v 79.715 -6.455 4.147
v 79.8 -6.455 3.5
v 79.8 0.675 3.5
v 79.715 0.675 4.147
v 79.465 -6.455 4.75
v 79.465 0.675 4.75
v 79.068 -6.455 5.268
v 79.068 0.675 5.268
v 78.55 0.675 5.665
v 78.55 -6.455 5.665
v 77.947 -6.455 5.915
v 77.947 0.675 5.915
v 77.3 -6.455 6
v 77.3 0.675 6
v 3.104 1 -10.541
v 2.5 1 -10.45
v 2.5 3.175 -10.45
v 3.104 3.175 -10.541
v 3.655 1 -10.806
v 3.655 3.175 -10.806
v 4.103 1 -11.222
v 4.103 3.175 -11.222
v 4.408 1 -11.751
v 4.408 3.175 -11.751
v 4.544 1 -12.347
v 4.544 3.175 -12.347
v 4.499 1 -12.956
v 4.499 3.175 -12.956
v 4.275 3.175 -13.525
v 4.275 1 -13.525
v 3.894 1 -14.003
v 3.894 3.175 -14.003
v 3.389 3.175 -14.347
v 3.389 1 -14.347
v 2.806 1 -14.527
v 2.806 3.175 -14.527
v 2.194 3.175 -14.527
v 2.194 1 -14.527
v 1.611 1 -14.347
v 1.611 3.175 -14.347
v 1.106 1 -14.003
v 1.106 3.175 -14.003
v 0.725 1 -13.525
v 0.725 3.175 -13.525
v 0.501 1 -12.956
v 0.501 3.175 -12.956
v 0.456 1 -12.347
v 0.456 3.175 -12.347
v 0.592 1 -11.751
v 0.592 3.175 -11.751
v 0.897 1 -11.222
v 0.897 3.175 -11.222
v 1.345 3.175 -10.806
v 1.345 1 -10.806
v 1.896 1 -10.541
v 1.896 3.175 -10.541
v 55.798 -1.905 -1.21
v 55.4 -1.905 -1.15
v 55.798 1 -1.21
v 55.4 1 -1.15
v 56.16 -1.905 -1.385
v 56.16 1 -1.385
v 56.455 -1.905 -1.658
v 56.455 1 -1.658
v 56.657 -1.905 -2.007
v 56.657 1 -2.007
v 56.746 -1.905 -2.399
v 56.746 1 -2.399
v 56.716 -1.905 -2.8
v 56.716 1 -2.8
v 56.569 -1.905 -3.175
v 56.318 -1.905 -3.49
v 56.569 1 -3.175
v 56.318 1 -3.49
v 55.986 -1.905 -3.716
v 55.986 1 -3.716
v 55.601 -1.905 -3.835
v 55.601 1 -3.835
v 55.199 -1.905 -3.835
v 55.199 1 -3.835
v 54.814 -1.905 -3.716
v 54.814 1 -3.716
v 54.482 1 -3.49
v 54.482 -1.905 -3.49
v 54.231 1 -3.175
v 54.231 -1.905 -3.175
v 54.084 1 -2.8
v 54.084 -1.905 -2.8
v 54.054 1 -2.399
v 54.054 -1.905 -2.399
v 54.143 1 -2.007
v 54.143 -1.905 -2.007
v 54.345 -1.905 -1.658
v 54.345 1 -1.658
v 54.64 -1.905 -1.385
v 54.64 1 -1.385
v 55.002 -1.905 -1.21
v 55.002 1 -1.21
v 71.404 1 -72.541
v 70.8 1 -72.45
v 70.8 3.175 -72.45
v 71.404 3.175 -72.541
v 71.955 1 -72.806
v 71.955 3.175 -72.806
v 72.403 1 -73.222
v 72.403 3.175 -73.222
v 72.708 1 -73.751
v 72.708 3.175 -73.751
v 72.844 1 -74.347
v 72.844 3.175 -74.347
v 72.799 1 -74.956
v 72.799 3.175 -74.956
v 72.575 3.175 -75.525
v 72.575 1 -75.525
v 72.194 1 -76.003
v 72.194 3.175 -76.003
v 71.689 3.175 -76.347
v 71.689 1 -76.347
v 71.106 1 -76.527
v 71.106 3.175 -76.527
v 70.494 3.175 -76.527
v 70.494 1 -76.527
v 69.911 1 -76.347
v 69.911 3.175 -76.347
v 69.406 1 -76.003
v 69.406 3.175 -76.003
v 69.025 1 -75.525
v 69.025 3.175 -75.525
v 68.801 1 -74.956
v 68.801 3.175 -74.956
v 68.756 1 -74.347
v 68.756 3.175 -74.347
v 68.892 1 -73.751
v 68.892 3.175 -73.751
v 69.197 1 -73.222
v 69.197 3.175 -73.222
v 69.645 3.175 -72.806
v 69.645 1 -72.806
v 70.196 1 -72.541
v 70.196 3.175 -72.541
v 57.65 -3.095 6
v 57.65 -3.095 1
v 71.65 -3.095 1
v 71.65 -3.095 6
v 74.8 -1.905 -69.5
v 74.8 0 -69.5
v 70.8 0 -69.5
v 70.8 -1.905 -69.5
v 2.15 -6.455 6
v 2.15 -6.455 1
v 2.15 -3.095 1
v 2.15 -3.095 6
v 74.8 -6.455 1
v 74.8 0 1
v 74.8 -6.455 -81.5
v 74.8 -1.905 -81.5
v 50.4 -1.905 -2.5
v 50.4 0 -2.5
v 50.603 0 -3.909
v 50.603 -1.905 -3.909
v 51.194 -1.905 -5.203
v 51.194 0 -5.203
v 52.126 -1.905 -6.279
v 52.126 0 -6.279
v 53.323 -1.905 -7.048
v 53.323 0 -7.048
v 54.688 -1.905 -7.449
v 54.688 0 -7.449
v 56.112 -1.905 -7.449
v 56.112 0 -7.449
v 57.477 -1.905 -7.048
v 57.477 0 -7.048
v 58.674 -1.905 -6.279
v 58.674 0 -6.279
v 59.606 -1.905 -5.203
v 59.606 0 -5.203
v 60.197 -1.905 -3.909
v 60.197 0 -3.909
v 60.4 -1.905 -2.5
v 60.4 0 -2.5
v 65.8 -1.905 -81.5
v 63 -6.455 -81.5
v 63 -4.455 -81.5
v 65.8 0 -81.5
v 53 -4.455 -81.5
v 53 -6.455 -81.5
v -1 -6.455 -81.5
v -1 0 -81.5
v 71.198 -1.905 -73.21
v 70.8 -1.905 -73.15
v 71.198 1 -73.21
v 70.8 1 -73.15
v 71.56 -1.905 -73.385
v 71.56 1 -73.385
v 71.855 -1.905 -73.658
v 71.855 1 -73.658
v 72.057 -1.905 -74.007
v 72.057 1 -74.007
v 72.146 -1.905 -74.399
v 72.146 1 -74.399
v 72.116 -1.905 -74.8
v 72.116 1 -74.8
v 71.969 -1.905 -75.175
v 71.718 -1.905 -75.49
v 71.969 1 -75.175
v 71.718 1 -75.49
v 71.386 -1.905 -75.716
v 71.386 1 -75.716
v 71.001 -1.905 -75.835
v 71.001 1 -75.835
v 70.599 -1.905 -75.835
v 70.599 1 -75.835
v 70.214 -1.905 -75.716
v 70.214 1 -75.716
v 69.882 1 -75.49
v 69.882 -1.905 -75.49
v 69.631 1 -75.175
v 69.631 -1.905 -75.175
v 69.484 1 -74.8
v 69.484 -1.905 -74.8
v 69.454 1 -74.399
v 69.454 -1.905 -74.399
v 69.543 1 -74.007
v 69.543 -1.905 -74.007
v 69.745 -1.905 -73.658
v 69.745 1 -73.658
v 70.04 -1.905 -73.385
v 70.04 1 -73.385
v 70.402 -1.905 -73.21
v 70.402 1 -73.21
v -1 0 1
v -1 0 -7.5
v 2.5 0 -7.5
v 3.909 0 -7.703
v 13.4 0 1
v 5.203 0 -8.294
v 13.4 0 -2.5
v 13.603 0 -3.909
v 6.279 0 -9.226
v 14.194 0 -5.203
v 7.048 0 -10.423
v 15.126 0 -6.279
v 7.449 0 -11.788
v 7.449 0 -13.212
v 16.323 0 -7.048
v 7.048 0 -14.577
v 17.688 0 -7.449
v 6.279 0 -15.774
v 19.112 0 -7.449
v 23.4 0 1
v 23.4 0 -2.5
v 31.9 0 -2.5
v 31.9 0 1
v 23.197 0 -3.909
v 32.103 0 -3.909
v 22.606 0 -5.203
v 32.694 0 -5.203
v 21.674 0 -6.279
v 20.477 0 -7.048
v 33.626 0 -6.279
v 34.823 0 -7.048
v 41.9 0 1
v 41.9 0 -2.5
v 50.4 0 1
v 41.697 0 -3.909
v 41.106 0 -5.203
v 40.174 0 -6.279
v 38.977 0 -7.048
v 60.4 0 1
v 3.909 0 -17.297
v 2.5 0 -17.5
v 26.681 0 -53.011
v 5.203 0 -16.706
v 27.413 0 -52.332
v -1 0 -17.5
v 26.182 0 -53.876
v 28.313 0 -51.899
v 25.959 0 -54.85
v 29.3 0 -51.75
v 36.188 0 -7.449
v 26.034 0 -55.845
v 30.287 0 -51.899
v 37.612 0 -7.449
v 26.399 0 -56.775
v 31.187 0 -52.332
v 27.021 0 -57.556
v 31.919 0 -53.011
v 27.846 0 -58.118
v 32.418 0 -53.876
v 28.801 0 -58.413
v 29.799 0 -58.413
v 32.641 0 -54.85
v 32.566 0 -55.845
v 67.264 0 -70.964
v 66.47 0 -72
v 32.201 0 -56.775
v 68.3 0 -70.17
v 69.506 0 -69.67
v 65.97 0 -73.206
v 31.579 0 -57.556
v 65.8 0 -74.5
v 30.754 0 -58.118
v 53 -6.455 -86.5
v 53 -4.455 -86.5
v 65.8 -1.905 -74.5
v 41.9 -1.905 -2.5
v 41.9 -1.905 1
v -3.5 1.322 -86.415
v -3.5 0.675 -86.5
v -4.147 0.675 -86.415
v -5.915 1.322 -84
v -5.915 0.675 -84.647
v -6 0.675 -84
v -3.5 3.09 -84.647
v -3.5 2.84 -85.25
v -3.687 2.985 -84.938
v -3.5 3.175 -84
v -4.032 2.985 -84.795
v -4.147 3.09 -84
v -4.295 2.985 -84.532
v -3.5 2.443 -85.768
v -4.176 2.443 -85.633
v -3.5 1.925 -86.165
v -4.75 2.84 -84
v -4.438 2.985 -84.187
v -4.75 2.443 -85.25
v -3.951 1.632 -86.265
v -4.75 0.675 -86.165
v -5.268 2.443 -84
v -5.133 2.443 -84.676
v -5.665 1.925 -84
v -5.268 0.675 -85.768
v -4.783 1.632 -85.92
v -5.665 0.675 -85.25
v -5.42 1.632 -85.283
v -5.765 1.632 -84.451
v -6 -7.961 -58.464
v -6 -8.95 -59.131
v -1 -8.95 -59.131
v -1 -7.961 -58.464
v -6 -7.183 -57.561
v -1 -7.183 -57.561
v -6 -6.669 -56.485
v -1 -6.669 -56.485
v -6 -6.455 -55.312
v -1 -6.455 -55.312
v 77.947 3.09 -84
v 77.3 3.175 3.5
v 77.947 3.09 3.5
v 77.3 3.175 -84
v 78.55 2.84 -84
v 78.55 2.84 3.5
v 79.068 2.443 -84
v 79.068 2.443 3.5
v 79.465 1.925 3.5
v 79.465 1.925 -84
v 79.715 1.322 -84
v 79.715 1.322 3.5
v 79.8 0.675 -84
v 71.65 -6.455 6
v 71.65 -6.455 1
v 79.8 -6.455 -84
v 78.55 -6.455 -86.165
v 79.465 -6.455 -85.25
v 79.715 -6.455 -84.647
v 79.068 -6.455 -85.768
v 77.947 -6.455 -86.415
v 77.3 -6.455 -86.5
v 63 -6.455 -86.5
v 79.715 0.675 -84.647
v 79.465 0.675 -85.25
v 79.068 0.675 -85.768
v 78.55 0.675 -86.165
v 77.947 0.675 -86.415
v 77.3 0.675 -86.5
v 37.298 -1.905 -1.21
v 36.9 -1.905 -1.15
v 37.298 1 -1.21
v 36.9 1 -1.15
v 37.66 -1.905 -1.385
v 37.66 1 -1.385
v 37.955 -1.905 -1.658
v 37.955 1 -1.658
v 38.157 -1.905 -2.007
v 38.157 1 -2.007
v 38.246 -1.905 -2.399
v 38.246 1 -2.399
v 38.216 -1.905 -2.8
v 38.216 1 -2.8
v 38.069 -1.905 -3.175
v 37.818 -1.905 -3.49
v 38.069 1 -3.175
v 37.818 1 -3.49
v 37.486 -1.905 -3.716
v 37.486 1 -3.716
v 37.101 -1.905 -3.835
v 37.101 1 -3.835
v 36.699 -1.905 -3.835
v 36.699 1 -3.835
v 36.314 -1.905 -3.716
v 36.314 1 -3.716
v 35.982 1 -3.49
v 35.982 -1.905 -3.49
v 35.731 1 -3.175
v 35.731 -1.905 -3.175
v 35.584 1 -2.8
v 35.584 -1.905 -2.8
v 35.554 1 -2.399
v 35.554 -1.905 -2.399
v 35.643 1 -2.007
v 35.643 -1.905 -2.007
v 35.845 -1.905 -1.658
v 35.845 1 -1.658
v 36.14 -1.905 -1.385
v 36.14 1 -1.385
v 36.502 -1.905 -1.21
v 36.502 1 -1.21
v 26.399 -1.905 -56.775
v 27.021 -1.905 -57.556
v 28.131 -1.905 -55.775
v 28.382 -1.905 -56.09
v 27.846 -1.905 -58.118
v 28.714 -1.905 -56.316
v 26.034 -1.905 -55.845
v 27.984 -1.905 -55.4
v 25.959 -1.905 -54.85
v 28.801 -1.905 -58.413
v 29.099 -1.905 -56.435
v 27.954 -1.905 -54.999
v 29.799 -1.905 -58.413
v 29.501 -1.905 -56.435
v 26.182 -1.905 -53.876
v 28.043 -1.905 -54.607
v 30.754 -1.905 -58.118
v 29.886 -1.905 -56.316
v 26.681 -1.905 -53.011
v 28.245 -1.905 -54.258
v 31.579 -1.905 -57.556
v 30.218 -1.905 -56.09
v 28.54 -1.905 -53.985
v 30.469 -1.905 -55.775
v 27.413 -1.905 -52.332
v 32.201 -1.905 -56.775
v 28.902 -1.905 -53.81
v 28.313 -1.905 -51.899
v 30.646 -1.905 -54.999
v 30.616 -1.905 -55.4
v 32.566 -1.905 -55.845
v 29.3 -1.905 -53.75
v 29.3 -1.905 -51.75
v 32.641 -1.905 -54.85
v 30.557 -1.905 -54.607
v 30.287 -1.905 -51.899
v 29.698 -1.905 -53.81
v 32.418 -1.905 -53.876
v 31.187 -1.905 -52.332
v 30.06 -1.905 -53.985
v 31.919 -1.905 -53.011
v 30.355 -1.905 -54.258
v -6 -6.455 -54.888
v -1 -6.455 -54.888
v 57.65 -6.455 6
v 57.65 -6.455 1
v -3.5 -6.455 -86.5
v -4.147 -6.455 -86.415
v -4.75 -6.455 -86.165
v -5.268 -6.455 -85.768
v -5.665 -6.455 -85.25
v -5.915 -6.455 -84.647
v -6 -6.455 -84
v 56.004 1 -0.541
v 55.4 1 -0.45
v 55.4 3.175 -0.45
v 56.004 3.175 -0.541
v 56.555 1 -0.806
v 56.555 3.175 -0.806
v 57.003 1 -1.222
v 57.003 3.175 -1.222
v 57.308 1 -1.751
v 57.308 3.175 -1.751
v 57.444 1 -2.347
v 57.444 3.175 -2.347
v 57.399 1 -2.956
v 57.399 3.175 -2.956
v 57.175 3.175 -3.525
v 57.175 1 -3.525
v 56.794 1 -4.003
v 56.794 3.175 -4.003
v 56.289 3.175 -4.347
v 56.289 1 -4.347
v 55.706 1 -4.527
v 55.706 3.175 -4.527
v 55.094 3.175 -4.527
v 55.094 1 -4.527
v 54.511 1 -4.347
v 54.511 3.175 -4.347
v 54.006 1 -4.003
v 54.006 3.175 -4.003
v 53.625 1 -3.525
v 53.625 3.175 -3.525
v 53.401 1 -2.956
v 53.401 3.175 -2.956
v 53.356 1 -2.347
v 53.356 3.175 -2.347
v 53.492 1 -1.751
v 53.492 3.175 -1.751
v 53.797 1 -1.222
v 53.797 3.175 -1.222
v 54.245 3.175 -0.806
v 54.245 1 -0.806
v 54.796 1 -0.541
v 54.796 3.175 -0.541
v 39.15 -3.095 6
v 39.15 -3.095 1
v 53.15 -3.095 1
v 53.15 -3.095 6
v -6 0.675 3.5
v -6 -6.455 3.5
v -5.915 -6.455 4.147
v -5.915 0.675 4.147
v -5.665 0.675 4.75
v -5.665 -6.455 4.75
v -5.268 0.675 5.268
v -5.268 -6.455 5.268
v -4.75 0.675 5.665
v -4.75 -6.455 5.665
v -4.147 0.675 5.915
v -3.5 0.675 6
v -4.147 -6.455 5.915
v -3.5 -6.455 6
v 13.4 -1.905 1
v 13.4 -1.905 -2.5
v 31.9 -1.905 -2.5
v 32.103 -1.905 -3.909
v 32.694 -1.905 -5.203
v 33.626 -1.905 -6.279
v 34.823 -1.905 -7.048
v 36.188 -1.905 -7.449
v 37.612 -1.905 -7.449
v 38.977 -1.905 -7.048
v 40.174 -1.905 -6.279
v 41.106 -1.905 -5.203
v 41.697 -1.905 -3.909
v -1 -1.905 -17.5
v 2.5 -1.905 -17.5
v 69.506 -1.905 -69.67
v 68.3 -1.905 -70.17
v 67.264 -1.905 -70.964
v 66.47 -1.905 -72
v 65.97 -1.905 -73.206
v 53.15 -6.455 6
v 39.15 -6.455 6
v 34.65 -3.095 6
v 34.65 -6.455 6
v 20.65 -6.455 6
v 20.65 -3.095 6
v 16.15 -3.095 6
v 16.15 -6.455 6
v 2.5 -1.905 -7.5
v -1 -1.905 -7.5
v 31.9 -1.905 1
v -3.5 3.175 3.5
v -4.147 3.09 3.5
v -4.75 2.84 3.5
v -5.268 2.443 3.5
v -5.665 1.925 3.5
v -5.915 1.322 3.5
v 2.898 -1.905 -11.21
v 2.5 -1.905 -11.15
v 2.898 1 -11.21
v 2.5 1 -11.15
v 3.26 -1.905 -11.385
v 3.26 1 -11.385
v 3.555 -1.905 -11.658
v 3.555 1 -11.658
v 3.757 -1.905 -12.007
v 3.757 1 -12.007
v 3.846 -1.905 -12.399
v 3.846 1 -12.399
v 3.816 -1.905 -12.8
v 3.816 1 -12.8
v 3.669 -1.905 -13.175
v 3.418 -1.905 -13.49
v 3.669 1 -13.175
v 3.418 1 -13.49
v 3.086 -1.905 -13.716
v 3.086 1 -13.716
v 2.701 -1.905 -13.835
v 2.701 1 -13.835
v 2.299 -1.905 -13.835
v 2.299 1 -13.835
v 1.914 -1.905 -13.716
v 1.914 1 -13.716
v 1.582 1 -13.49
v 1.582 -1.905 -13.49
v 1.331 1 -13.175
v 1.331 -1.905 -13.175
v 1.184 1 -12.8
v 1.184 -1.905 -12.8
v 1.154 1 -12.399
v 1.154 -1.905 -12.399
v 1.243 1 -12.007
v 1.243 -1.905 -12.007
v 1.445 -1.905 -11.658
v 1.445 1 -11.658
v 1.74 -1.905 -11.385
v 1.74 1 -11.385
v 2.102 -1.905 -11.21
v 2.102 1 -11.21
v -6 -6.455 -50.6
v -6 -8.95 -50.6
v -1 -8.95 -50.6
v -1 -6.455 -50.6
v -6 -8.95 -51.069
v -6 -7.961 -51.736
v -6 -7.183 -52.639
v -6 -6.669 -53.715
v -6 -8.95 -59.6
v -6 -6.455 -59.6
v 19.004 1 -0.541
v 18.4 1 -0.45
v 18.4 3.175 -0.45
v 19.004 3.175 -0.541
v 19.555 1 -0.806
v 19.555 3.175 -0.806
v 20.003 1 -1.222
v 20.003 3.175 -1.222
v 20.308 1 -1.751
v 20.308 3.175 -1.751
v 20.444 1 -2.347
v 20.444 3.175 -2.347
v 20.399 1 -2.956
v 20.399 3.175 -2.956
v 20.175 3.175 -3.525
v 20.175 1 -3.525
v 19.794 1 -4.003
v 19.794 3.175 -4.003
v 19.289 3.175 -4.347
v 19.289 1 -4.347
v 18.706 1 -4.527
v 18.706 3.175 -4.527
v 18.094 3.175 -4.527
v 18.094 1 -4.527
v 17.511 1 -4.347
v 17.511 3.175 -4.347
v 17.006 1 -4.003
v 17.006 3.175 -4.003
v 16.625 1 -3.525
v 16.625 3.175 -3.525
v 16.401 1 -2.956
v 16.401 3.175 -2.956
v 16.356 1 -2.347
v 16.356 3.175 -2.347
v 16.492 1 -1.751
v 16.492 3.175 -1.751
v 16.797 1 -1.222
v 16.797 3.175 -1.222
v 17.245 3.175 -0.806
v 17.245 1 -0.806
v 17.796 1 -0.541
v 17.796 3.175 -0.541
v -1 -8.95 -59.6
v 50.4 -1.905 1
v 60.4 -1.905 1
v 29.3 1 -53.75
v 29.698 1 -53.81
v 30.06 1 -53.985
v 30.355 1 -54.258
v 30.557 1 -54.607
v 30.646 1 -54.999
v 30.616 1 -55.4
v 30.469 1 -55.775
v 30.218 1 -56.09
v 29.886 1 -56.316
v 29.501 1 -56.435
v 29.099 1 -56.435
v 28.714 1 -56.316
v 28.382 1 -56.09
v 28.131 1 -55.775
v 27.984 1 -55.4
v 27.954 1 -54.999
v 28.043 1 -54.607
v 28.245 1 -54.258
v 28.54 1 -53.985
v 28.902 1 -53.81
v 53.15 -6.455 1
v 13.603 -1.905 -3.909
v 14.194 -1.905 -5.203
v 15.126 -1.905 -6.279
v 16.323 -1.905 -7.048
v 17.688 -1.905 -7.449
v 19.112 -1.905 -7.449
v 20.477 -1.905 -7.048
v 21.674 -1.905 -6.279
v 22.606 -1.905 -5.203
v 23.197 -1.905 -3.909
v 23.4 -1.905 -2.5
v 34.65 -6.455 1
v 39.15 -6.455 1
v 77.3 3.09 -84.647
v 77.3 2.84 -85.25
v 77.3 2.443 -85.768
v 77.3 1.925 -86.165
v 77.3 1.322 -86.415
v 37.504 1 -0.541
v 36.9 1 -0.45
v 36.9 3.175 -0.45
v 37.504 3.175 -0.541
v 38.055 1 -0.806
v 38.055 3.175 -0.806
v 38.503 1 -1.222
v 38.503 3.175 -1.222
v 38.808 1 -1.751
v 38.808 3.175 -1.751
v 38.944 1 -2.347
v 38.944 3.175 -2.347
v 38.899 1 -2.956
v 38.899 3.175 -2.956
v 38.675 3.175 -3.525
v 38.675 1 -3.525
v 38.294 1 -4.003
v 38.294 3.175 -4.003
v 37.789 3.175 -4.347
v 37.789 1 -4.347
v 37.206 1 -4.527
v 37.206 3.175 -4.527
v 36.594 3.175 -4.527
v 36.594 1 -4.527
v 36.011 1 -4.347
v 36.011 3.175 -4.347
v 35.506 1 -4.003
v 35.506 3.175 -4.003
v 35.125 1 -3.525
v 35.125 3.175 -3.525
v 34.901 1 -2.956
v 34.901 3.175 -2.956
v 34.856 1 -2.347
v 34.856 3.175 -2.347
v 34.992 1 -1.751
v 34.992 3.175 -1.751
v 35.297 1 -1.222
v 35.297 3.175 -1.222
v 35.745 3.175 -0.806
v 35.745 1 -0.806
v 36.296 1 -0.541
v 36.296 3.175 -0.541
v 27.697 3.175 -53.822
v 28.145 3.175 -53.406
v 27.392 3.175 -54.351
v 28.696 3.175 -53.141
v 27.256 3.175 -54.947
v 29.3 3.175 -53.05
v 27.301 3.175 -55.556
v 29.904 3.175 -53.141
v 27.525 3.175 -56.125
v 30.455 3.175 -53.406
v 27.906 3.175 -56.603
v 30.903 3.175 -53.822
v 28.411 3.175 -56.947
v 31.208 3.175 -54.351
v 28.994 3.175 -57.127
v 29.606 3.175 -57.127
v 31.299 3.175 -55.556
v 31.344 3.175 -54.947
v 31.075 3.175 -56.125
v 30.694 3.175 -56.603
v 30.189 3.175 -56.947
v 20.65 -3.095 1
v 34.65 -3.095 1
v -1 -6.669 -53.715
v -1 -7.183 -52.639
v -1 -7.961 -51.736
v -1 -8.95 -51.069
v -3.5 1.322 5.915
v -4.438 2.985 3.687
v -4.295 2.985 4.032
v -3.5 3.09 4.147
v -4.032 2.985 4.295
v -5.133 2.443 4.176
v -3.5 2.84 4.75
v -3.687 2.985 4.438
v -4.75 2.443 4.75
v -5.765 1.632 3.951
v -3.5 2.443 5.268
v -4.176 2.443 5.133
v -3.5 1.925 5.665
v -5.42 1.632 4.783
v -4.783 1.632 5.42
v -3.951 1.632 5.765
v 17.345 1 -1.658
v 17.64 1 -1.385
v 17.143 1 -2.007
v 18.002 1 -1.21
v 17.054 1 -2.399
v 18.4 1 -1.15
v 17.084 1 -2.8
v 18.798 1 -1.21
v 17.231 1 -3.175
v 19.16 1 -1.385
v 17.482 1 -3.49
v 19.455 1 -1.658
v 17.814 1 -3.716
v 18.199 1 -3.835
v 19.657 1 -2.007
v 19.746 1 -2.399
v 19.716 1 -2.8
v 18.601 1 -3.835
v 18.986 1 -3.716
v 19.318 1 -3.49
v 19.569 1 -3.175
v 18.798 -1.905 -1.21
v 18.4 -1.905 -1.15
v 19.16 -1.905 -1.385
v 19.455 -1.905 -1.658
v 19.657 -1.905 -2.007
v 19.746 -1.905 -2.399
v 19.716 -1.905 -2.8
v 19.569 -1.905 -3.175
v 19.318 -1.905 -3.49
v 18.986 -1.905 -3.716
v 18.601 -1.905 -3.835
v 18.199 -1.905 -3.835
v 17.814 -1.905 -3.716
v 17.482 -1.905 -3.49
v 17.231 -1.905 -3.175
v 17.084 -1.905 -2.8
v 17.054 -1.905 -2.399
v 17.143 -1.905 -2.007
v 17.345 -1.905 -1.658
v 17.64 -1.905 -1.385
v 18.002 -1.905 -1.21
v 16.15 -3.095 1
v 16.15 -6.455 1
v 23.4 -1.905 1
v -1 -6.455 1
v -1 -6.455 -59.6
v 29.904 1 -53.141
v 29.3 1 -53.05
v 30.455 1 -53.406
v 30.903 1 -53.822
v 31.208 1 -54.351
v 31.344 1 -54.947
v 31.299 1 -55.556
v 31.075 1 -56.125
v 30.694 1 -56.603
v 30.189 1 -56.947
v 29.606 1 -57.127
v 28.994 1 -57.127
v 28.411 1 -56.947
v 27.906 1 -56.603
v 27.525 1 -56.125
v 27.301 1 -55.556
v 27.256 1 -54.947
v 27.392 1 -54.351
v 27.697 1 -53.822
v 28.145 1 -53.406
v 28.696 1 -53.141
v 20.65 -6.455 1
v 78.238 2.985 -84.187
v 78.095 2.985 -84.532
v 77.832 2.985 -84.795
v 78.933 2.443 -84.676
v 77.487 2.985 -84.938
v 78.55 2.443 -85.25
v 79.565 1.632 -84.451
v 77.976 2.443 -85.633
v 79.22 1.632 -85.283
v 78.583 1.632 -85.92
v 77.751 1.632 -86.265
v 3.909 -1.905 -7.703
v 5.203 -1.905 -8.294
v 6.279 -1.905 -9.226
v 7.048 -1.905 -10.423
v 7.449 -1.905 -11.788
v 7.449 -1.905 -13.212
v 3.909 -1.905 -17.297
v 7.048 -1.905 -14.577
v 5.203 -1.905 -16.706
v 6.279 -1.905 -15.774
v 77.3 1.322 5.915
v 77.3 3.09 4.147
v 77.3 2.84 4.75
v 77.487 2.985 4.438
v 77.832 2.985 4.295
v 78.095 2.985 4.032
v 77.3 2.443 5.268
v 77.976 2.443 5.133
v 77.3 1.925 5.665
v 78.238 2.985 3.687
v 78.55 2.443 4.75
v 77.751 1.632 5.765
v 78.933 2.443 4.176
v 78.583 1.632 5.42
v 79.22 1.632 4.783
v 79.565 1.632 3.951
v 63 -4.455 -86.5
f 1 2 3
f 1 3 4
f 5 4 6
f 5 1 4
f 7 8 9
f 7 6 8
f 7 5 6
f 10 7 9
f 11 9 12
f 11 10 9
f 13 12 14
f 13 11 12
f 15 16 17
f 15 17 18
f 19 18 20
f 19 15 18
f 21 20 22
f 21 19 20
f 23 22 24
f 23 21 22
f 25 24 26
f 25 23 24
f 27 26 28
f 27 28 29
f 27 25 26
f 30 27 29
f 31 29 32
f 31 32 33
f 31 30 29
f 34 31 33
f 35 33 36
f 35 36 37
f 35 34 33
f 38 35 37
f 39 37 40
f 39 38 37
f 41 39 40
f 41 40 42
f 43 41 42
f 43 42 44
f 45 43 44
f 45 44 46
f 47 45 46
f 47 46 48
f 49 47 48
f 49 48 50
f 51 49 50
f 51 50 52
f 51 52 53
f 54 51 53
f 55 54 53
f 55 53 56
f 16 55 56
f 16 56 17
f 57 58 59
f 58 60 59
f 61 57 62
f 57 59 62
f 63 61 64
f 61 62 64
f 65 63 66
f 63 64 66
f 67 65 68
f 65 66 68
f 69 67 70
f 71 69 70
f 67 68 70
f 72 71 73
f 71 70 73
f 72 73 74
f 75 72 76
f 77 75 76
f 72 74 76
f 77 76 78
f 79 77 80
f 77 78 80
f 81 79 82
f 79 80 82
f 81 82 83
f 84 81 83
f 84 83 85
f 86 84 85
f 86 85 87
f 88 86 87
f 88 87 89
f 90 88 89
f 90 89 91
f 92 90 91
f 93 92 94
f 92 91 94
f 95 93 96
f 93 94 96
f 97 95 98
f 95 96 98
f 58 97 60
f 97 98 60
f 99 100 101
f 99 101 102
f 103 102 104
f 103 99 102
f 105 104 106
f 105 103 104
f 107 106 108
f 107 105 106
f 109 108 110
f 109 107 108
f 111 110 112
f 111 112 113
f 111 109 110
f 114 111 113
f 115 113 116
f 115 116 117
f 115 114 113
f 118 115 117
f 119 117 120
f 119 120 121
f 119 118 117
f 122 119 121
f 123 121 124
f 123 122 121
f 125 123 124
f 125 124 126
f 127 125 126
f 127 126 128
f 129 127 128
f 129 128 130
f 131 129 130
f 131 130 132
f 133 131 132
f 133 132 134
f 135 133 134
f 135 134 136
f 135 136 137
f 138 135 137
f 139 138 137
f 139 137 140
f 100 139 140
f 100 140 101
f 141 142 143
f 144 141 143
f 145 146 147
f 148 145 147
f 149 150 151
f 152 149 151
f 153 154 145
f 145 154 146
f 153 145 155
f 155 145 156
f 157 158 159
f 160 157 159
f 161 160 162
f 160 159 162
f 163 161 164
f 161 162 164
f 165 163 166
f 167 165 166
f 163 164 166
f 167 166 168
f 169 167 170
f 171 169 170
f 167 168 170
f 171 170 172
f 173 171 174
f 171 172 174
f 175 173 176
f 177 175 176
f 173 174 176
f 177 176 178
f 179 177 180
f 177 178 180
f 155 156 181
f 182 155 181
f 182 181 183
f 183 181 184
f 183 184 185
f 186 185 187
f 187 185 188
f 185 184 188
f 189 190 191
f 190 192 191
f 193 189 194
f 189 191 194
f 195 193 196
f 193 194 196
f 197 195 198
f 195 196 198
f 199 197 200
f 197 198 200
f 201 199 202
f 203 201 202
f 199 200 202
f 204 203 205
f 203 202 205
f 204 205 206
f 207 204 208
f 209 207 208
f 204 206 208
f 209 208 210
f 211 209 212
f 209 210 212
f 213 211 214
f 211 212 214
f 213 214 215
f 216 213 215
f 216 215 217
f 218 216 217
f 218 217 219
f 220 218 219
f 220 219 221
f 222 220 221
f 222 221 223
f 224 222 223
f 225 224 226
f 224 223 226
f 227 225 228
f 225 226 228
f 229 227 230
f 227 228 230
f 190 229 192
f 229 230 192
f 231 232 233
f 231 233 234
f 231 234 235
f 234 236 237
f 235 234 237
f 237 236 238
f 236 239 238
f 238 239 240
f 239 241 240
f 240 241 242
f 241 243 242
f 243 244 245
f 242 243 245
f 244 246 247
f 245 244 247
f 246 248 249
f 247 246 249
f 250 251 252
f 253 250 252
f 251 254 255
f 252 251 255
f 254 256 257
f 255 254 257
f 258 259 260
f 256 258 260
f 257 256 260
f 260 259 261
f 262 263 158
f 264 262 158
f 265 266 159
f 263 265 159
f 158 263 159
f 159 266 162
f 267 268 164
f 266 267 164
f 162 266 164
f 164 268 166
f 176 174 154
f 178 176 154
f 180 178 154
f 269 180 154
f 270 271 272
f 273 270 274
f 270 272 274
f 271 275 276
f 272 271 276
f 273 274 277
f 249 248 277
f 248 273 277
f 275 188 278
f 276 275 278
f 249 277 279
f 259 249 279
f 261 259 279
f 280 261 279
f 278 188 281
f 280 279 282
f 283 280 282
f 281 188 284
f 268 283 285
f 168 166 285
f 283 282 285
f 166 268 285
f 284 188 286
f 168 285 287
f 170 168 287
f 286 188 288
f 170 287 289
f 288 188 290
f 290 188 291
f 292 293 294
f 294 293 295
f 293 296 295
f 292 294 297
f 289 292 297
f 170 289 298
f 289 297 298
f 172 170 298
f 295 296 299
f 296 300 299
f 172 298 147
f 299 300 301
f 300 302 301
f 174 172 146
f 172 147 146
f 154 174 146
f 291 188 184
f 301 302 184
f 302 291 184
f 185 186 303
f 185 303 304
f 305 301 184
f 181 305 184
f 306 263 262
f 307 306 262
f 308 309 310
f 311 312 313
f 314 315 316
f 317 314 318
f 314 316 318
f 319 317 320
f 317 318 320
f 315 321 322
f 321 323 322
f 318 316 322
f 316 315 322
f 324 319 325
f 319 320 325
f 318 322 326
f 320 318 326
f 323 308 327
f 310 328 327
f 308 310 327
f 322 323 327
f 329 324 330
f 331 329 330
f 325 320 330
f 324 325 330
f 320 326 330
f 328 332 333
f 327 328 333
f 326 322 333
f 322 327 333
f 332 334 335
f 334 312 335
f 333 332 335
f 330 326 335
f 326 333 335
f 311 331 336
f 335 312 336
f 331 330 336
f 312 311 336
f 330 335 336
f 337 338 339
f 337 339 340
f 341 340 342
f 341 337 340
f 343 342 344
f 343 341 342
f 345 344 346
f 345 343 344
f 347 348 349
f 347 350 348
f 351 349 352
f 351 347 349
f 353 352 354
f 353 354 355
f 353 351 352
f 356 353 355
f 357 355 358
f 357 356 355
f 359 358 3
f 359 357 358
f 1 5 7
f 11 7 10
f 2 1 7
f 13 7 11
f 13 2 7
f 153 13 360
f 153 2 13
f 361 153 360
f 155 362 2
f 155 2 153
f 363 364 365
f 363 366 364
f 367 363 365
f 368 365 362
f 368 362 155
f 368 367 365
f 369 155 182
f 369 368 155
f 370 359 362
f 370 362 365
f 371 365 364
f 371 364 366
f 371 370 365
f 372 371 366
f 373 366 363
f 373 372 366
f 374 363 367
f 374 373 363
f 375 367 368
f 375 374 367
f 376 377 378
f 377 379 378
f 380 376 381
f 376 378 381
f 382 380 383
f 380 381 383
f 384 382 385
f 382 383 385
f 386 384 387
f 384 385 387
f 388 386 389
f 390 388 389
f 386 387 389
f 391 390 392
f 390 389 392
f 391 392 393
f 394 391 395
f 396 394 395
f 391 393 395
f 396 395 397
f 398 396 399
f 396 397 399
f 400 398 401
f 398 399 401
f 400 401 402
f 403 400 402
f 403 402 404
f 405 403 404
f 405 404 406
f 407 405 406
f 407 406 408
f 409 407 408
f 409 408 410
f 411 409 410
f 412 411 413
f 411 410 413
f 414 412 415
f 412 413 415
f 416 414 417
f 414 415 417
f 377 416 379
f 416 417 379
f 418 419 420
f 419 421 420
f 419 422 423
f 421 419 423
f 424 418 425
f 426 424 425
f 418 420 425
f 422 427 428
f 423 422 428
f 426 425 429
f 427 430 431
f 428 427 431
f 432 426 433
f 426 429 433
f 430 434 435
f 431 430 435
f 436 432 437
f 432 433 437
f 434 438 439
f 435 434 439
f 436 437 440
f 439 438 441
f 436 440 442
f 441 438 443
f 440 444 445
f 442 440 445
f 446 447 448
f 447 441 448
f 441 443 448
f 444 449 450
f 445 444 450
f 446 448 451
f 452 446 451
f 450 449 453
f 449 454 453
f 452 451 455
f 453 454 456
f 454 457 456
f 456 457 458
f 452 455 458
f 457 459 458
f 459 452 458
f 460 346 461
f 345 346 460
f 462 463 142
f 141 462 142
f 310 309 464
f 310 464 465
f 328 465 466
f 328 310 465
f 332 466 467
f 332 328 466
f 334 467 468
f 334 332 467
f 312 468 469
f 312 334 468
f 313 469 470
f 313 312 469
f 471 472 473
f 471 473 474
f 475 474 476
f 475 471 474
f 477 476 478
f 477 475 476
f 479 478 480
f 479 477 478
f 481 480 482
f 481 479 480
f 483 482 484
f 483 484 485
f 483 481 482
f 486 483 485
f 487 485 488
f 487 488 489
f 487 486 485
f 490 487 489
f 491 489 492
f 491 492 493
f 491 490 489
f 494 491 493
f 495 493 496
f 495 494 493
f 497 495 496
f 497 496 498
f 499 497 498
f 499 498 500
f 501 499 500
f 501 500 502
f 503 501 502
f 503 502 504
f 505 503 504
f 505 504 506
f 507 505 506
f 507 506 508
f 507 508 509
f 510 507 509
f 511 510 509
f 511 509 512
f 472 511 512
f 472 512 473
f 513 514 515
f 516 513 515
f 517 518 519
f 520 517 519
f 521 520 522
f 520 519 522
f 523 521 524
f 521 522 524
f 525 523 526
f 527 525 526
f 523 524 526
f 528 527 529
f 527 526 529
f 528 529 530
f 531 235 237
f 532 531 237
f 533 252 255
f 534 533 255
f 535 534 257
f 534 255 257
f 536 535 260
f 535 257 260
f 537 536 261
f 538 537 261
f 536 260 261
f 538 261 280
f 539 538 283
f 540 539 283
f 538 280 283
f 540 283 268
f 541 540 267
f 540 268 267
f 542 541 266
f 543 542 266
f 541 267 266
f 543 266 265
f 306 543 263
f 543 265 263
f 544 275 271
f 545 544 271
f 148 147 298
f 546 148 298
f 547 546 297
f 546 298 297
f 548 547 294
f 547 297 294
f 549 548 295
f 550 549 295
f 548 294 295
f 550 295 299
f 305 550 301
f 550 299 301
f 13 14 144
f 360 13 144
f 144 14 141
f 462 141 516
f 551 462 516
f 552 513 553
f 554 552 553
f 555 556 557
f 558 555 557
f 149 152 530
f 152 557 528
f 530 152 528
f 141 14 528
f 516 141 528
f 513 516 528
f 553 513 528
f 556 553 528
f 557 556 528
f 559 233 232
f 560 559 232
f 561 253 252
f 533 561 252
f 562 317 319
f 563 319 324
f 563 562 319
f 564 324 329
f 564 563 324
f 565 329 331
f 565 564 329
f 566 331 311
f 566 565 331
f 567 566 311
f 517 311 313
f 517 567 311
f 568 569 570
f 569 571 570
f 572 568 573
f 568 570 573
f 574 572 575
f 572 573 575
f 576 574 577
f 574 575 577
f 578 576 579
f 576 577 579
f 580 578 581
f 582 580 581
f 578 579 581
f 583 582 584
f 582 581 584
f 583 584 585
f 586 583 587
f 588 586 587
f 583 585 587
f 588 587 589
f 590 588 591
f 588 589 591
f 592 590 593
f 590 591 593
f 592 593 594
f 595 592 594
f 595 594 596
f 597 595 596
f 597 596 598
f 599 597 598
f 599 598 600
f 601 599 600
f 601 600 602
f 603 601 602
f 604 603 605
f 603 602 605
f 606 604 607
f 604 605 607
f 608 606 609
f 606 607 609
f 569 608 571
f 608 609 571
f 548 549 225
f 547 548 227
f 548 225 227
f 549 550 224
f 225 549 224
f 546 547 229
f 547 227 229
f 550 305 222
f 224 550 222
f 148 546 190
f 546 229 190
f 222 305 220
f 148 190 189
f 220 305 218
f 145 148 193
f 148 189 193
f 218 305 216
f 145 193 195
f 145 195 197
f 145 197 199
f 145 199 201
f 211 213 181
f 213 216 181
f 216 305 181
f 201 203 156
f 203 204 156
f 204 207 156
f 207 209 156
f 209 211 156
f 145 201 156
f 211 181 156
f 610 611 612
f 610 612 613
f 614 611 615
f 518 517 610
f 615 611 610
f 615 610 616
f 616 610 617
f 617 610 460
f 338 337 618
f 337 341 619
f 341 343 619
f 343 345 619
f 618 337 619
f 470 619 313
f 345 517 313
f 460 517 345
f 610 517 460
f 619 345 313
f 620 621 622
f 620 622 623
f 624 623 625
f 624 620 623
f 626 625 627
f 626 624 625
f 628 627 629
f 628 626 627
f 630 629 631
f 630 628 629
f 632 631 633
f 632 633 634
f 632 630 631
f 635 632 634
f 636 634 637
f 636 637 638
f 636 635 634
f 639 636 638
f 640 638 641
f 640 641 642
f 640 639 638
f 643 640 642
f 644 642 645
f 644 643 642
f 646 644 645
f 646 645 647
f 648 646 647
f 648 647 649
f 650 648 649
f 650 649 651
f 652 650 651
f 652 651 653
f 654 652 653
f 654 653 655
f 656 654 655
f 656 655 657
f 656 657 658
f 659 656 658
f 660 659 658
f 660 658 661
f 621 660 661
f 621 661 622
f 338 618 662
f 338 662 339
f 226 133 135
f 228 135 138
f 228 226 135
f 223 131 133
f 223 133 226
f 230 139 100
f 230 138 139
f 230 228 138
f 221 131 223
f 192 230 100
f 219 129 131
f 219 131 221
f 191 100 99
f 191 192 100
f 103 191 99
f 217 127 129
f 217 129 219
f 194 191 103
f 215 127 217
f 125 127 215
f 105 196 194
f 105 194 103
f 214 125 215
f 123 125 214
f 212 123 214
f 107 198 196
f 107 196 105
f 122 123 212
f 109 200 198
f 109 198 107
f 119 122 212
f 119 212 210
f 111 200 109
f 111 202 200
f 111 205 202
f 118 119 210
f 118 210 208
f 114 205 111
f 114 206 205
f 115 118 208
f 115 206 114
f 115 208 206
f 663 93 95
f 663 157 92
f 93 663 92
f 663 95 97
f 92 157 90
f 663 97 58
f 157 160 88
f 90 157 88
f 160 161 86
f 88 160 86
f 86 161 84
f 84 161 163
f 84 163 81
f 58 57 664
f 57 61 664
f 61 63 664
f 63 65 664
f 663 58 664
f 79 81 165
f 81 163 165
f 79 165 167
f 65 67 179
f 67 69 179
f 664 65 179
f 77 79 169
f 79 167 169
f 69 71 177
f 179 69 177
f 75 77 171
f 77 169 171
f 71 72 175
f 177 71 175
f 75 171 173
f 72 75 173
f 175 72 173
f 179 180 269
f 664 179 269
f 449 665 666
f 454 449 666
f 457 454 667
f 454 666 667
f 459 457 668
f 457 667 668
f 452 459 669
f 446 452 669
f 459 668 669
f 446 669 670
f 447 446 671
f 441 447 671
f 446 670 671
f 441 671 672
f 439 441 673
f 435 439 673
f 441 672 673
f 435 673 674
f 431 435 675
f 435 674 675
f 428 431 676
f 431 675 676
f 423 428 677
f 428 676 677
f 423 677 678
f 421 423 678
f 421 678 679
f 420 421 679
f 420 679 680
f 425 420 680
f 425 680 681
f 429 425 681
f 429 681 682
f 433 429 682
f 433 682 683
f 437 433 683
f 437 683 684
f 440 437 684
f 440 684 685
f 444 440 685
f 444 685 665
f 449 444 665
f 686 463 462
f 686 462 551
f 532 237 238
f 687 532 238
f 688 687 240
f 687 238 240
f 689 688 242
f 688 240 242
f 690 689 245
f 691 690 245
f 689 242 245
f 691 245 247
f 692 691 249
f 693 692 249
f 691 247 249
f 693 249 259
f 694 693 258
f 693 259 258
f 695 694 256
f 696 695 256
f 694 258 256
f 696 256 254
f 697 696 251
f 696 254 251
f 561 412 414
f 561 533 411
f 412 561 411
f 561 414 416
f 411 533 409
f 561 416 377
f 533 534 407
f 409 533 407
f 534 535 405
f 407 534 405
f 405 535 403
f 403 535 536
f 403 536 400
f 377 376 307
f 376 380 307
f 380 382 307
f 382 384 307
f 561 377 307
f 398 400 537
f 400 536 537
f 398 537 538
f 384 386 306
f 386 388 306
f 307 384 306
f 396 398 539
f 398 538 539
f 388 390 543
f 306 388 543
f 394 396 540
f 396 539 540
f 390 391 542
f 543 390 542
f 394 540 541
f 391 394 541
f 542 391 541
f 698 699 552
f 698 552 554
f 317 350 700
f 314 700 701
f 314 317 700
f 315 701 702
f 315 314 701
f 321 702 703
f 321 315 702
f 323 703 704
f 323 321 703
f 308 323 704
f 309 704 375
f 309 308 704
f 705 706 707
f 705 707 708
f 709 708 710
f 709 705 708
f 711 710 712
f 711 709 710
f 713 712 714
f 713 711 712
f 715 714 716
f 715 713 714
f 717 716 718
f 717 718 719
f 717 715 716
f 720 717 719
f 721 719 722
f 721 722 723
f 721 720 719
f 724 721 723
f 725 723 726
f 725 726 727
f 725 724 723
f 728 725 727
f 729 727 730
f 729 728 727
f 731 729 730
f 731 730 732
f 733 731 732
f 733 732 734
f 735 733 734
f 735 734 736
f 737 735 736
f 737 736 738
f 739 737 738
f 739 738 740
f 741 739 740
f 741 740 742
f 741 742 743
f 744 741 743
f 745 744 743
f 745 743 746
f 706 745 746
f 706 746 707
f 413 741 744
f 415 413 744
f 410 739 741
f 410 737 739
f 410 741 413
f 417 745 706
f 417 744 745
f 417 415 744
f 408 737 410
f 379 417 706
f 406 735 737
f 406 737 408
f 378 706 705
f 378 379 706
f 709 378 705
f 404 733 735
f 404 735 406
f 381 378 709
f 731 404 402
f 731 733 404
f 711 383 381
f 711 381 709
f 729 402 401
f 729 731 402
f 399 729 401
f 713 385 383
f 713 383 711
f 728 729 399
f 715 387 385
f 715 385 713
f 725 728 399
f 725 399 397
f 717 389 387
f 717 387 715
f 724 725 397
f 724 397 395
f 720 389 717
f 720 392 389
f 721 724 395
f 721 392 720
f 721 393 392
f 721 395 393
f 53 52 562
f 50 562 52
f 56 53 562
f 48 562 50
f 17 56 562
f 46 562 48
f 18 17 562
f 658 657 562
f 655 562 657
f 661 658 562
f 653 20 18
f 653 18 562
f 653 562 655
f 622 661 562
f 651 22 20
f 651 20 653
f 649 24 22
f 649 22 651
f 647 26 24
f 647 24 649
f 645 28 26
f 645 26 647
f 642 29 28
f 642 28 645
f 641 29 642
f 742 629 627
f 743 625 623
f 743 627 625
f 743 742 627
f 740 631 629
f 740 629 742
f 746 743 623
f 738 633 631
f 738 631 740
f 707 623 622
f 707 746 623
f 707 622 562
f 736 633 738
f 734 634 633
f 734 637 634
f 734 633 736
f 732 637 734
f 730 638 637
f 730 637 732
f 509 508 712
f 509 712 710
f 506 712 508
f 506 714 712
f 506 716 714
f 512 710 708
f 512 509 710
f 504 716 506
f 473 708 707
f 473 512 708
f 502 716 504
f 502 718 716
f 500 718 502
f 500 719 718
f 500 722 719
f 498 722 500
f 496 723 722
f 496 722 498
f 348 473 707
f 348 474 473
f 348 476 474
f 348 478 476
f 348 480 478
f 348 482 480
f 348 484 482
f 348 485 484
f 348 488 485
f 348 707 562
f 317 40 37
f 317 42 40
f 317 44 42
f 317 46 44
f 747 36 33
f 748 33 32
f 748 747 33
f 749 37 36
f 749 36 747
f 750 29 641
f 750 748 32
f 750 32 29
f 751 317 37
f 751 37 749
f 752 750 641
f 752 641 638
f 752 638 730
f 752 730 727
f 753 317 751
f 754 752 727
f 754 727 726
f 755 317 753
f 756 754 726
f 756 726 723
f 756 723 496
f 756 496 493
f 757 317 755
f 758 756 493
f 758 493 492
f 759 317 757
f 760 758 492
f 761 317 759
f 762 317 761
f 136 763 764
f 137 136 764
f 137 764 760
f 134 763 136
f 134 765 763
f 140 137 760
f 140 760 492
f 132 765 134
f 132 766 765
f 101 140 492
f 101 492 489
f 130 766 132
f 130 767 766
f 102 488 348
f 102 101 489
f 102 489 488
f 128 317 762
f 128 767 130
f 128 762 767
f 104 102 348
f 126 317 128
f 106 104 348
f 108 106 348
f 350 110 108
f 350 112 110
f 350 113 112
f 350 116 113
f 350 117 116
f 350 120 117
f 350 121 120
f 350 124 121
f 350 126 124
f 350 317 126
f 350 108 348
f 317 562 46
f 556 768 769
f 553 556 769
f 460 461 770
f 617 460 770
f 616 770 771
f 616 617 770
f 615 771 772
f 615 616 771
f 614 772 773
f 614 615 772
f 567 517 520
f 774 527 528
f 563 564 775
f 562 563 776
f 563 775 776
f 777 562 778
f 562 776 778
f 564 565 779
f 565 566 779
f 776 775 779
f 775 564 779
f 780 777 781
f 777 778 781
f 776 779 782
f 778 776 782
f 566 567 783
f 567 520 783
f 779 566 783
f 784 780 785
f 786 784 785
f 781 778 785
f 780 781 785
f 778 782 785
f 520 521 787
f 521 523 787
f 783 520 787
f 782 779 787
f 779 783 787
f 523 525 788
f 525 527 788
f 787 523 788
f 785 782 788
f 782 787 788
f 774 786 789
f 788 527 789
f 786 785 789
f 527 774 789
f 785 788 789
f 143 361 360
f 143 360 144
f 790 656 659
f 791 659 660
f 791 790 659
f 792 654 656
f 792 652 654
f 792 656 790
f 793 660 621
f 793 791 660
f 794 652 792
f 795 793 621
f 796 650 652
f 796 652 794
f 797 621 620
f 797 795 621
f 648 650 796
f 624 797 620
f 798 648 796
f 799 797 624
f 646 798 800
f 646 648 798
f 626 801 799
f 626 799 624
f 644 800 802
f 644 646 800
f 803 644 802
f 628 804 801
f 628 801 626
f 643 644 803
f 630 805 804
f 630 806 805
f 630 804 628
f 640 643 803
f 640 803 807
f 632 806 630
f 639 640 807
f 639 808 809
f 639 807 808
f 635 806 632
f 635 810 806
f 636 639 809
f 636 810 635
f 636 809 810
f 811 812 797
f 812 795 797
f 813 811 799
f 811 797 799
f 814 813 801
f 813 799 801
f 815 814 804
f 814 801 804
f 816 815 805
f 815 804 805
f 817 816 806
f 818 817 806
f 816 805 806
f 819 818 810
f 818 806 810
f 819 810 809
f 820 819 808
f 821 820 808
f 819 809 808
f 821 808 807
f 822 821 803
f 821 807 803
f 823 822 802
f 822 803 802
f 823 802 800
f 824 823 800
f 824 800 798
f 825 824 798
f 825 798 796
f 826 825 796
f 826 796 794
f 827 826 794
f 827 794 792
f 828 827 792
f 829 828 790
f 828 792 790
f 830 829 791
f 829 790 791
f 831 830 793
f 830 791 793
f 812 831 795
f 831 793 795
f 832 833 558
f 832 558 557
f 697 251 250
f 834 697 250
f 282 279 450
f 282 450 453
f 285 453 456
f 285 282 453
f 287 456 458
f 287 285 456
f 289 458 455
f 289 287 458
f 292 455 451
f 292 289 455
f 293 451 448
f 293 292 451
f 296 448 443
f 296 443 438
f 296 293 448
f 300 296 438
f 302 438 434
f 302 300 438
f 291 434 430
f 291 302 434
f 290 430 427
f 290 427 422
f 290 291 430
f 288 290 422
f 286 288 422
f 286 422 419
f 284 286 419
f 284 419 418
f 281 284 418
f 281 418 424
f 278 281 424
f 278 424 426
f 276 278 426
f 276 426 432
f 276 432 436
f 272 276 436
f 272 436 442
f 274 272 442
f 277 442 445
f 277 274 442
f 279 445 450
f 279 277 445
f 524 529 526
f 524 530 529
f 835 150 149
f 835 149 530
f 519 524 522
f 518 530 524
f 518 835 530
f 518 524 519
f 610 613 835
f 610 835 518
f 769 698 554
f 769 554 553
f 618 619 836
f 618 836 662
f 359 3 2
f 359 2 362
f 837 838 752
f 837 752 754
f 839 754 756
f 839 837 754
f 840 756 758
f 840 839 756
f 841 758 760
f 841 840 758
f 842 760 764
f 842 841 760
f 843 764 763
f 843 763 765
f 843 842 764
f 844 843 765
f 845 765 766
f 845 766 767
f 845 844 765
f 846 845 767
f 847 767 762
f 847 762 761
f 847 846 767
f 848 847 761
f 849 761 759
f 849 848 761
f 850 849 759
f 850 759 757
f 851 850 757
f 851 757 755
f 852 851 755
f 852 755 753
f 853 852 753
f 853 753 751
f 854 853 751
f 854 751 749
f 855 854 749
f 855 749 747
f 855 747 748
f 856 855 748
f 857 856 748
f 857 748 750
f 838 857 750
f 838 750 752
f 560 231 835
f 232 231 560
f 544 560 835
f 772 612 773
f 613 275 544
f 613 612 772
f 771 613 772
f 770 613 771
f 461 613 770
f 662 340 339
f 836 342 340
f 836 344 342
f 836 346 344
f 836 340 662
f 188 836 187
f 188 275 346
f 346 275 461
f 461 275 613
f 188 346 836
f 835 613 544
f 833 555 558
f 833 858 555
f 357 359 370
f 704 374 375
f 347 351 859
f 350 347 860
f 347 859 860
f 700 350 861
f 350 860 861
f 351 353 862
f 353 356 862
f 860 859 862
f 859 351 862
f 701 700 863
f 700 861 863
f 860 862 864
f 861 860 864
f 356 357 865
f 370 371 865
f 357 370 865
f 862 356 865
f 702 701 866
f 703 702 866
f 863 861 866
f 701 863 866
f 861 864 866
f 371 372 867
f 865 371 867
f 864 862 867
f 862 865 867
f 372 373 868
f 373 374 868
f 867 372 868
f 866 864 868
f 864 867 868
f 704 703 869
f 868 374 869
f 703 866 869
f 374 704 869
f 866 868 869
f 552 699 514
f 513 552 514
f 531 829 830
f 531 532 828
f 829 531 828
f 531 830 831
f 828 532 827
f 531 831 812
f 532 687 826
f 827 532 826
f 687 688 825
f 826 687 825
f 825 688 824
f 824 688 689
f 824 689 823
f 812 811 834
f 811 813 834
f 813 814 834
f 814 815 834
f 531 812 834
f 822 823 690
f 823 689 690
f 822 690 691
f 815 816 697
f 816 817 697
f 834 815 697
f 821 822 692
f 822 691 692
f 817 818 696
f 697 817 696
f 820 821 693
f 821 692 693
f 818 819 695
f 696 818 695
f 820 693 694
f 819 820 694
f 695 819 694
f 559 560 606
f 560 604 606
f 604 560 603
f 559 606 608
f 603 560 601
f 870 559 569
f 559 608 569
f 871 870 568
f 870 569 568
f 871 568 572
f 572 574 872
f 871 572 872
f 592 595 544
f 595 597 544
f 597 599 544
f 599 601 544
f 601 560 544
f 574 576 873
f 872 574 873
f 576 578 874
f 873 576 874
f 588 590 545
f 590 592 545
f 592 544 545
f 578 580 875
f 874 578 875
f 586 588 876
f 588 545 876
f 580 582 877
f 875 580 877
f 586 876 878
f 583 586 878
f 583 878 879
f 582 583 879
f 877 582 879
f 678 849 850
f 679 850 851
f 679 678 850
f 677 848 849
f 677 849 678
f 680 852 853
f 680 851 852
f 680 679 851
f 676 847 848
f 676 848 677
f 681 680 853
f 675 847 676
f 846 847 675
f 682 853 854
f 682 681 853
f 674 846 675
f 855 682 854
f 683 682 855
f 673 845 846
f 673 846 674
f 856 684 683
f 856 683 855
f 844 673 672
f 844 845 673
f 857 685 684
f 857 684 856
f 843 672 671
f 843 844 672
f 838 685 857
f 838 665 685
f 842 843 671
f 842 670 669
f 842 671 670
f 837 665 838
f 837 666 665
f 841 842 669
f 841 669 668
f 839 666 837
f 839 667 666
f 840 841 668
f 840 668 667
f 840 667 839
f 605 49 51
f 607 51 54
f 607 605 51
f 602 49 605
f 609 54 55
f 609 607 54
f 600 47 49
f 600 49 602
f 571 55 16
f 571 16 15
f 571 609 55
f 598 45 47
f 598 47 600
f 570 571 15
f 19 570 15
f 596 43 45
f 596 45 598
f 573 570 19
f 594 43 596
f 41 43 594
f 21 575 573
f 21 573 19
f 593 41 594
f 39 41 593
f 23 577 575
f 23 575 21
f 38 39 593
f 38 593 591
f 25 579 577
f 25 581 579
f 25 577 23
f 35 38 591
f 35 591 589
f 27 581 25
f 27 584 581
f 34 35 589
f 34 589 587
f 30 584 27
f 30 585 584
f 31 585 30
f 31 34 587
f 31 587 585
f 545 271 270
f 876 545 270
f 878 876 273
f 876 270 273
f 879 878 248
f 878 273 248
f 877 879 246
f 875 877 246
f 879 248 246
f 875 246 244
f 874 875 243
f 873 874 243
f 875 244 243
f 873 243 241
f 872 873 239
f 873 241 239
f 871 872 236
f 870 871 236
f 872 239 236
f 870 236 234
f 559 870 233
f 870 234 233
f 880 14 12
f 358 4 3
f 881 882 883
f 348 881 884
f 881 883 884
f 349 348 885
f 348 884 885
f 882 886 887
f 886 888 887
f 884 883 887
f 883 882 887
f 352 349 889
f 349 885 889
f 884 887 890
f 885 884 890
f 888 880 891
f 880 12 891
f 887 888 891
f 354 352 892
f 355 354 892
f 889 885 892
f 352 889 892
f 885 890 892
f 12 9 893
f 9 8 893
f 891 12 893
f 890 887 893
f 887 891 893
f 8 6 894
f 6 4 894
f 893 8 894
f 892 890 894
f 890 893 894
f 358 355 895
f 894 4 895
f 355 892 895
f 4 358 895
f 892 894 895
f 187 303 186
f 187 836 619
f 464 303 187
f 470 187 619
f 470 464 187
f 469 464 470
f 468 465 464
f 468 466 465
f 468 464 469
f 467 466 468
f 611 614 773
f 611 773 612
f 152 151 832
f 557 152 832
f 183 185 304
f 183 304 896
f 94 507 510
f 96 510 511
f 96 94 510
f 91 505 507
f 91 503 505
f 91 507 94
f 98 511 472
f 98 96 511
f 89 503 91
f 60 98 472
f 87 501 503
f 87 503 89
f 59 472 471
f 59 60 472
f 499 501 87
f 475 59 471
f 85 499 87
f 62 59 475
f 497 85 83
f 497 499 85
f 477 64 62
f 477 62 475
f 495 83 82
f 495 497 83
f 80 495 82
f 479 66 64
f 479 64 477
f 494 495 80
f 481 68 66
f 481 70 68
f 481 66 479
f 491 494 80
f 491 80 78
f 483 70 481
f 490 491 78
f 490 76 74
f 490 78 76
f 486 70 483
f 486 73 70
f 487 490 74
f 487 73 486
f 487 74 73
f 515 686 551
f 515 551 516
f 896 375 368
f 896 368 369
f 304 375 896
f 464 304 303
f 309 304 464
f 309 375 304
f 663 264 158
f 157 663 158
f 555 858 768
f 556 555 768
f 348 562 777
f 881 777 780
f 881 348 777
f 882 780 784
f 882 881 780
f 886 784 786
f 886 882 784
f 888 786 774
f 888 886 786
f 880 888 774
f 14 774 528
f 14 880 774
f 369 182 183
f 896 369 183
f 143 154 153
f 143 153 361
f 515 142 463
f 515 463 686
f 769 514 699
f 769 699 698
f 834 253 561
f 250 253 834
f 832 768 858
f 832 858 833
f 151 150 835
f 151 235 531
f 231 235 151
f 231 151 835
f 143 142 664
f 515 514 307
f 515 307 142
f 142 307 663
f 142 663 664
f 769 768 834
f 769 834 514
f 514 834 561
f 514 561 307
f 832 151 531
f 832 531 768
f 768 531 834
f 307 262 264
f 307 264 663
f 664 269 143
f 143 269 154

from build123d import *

# Parameters (mm, degrees)
SKETCH1_W           = 85.8
SKETCH1_H           = 92.5
SKETCH1_R           = 2.05
BOSS_EXTRUDE1_DEPTH = 3.175
SKETCH2_W           = 85.8
SKETCH2_H           = 92.5
SKETCH2_R           = 1.35
SKETCH2_R_2         = 3.35
BOSS_EXTRUDE2_DEPTH = 1.905
BOSS_EXTRUDE3_START = 1
SKETCH2_3_W         = 85.8
SKETCH2_3_H         = 92.5
SKETCH2_3_R         = 1.35
SKETCH2_3_R_2       = 3.35
BOSS_EXTRUDE3_DEPTH = 1
SKETCH3_W           = 85.8
SKETCH3_H           = 92.5
SKETCH3_W_2         = 75.8
SKETCH3_H_2         = 82.5
BOSS_EXTRUDE4_DEPTH = 4.55
SKETCH4_W           = 14
SKETCH4_H           = 6.75
CUT_EXTRUDE1_DEPTH  = 118.864146478
SKETCH5_W           = 10
SKETCH5_H           = 6
CUT_EXTRUDE2_DEPTH  = 118.864146478
BOSS_EXTRUDE5_DEPTH = 5
FILLET1_R           = 2.5
FILLET2_R           = 2.5
FILLET3_R           = 2.5
FILLET4_R           = 2.5
FILLET5_R           = 2.5


with BuildPart() as part:
    # Sketch1 → Boss-Extrude1 (new body)
    with BuildSketch(Plane(origin=(0, 0, 0), x_dir=(1, 0, 0), z_dir=(0, 1, 0))):
        with Locations((36.9, 40.25)):
            Rectangle(SKETCH1_W, SKETCH1_H)
        with Locations((2.5, 12.5)):
            Circle(SKETCH1_R, mode=Mode.SUBTRACT)
        with Locations((18.4, 2.5)):
            Circle(SKETCH1_R, mode=Mode.SUBTRACT)
        with Locations((36.9, 2.5)):
            Circle(SKETCH1_R, mode=Mode.SUBTRACT)
        with Locations((55.4, 2.5)):
            Circle(SKETCH1_R, mode=Mode.SUBTRACT)
        with Locations((29.3, 55.1)):
            Circle(SKETCH1_R, mode=Mode.SUBTRACT)
        with Locations((70.8, 74.5)):
            Circle(SKETCH1_R, mode=Mode.SUBTRACT)
    extrude(amount=BOSS_EXTRUDE1_DEPTH)

    # Sketch2 → Boss-Extrude2 (add)
    # profile 1 of 2: a face of its own
    with BuildSketch(Plane(origin=(0, 0, 0), x_dir=(1, 0, 0), z_dir=(0, 1, 0))):
        with Locations((36.9, 40.25)):
            Rectangle(SKETCH2_W, SKETCH2_H)
        with Locations((2.5, 12.5)):
            Circle(SKETCH2_R, mode=Mode.SUBTRACT)
        with Locations((18.4, 2.5)):
            Circle(SKETCH2_R, mode=Mode.SUBTRACT)
        with Locations((36.9, 2.5)):
            Circle(SKETCH2_R, mode=Mode.SUBTRACT)
        with Locations((55.4, 2.5)):
            Circle(SKETCH2_R, mode=Mode.SUBTRACT)
        with BuildLine():
            Line((-1, 7.5), (2.5, 7.5))
            ThreePointArc((2.5, 7.5), (7.5, 12.5), (2.5, 17.5))
            Line((2.5, 17.5), (-1, 17.5))
            Line((-1, 17.5), (-1, 81.5))
            Line((-1, 81.5), (65.8, 81.5))
            Line((65.8, 81.5), (65.8, 74.5))
            ThreePointArc((65.8, 74.5), (67.264466094, 70.964466094), (70.8, 69.5))
            Line((70.8, 69.5), (74.8, 69.5))
            Line((74.8, 69.5), (74.8, -1))
            Line((74.8, -1), (60.4, -1))
            Line((60.4, -1), (60.4, 2.5))
            ThreePointArc((60.4, 2.5), (55.4, 7.5), (50.4, 2.5))
            Line((50.4, 2.5), (50.4, -1))
            Line((50.4, -1), (41.9, -1))
            Line((41.9, -1), (41.9, 2.5))
            ThreePointArc((41.9, 2.5), (36.9, 7.5), (31.9, 2.5))
            Line((31.9, 2.5), (31.9, -1))
            Line((31.9, -1), (23.4, -1))
            Line((23.4, -1), (23.4, 2.5))
            ThreePointArc((23.4, 2.5), (18.4, 7.5), (13.4, 2.5))
            Line((13.4, 2.5), (13.4, -1))
            Line((13.4, -1), (-1, -1))
            Line((-1, -1), (-1, 7.5))
        make_face(mode=Mode.SUBTRACT)
        with Locations((70.8, 74.5)):
            Circle(SKETCH2_R, mode=Mode.SUBTRACT)
    # profile 2 of 2: a face of its own
    with BuildSketch(Plane(origin=(0, 0, 0), x_dir=(1, 0, 0), z_dir=(0, 1, 0))):
        with Locations((29.3, 55.1)):
            Circle(SKETCH2_R_2)
        with Locations((29.3, 55.1)):
            Circle(SKETCH2_R, mode=Mode.SUBTRACT)
    extrude(amount=-BOSS_EXTRUDE2_DEPTH)

    # Sketch2<3> → Boss-Extrude3 (add)
    # profile 1 of 2: a face of its own
    with BuildSketch(Plane(origin=(0, 0, 0), x_dir=(1, 0, 0), z_dir=(0, 1, 0)).offset(BOSS_EXTRUDE3_START)):
        with Locations((36.9, 40.25)):
            Rectangle(SKETCH2_3_W, SKETCH2_3_H)
        with Locations((2.5, 12.5)):
            Circle(SKETCH2_3_R, mode=Mode.SUBTRACT)
        with Locations((18.4, 2.5)):
            Circle(SKETCH2_3_R, mode=Mode.SUBTRACT)
        with Locations((36.9, 2.5)):
            Circle(SKETCH2_3_R, mode=Mode.SUBTRACT)
        with Locations((55.4, 2.5)):
            Circle(SKETCH2_3_R, mode=Mode.SUBTRACT)
        with BuildLine():
            Line((-1, 7.5), (2.5, 7.5))
            ThreePointArc((2.5, 7.5), (7.5, 12.5), (2.5, 17.5))
            Line((2.5, 17.5), (-1, 17.5))
            Line((-1, 17.5), (-1, 81.5))
            Line((-1, 81.5), (65.8, 81.5))
            Line((65.8, 81.5), (65.8, 74.5))
            ThreePointArc((65.8, 74.5), (67.264466094, 70.964466094), (70.8, 69.5))
            Line((70.8, 69.5), (74.8, 69.5))
            Line((74.8, 69.5), (74.8, -1))
            Line((74.8, -1), (60.4, -1))
            Line((60.4, -1), (60.4, 2.5))
            ThreePointArc((60.4, 2.5), (55.4, 7.5), (50.4, 2.5))
            Line((50.4, 2.5), (50.4, -1))
            Line((50.4, -1), (41.9, -1))
            Line((41.9, -1), (41.9, 2.5))
            ThreePointArc((41.9, 2.5), (36.9, 7.5), (31.9, 2.5))
            Line((31.9, 2.5), (31.9, -1))
            Line((31.9, -1), (23.4, -1))
            Line((23.4, -1), (23.4, 2.5))
            ThreePointArc((23.4, 2.5), (18.4, 7.5), (13.4, 2.5))
            Line((13.4, 2.5), (13.4, -1))
            Line((13.4, -1), (-1, -1))
            Line((-1, -1), (-1, 7.5))
        make_face(mode=Mode.SUBTRACT)
        with Locations((70.8, 74.5)):
            Circle(SKETCH2_3_R, mode=Mode.SUBTRACT)
    # profile 2 of 2: a face of its own
    with BuildSketch(Plane(origin=(0, 0, 0), x_dir=(1, 0, 0), z_dir=(0, 1, 0)).offset(BOSS_EXTRUDE3_START)):
        with Locations((29.3, 55.1)):
            Circle(SKETCH2_3_R_2)
        with Locations((29.3, 55.1)):
            Circle(SKETCH2_3_R, mode=Mode.SUBTRACT)
    extrude(amount=-BOSS_EXTRUDE3_DEPTH)

    # Sketch3 → Boss-Extrude4 (add)
    with BuildSketch(Plane(origin=(0, -1.905, 0), x_dir=(-1, 0, 0), z_dir=(0, -1, 0))):
        with Locations((-36.9, 40.25)):
            Rectangle(SKETCH3_W, SKETCH3_H)
        with Locations((-36.9, 40.25)):
            Rectangle(SKETCH3_W_2, SKETCH3_H_2, mode=Mode.SUBTRACT)
    extrude(amount=BOSS_EXTRUDE4_DEPTH)

    # Sketch4 → Cut-Extrude1 (cut, through all)
    with BuildSketch(Plane.XY):
        with Locations((9.15, -6.47)):
            Rectangle(SKETCH4_W, SKETCH4_H)
        with Locations((27.65, -6.47)):
            Rectangle(SKETCH4_W, SKETCH4_H)
        with Locations((46.15, -6.47)):
            Rectangle(SKETCH4_W, SKETCH4_H)
        with Locations((64.65, -6.47)):
            Rectangle(SKETCH4_W, SKETCH4_H)
    extrude(amount=CUT_EXTRUDE1_DEPTH, mode=Mode.SUBTRACT)

    # Sketch5 → Cut-Extrude2 (cut, through all)
    with BuildSketch(Plane.XY):
        with Locations((58, -7.455)):
            Rectangle(SKETCH5_W, SKETCH5_H)
    extrude(amount=-CUT_EXTRUDE2_DEPTH, mode=Mode.SUBTRACT)

    # Sketch6 → Boss-Extrude5 (add)
    with BuildSketch(Plane.ZY.offset(6)):
        with BuildLine():
            Line((-59.6, 0), (-59.6, -8.95))
            Line((-59.6, -8.95), (-59.131128874, -8.95))
            ThreePointArc((-59.131128874, -8.95), (-55.1, -6.45), (-51.068871126, -8.95))
            Line((-51.068871126, -8.95), (-50.6, -8.95))
            Line((-50.6, -8.95), (-50.6, 0))
            Line((-50.6, 0), (-59.6, 0))
        make_face()
    extrude(amount=-BOSS_EXTRUDE5_DEPTH)

    # Fillet1
    fillet1_edges = [part.edges().sort_by_distance(p)[0] for p in [
        (79.8, -1.64, 6),
    ]]
    fillet(fillet1_edges, radius=FILLET1_R)

    # Fillet2
    fillet2_edges = [part.edges().sort_by_distance(p)[0] for p in [
        (79.8, -1.64, -86.5),
    ]]
    fillet(fillet2_edges, radius=FILLET2_R)

    # Fillet3
    fillet3_edges = [part.edges().sort_by_distance(p)[0] for p in [
        (-6, -1.64, -86.5),
    ]]
    fillet(fillet3_edges, radius=FILLET3_R)

    # Fillet4
    fillet4_edges = [part.edges().sort_by_distance(p)[0] for p in [
        (-6, -1.64, 6),
    ]]
    fillet(fillet4_edges, radius=FILLET4_R)

    # Fillet5
    fillet5_edges = [part.edges().sort_by_distance(p)[0] for p in [
        (79.067766953, 3.175, -85.767766953),
        (79.8, 3.175, -40.25),
        (79.067766953, 3.175, 5.267766953),
        (36.9, 3.175, 6),
        (-5.267766953, 3.175, 5.267766953),
        (-6, 3.175, -40.25),
        (-5.267766953, 3.175, -85.767766953),
        (36.9, 3.175, -86.5),
    ]]
    fillet(fillet5_edges, radius=FILLET5_R)


solid = part.part
